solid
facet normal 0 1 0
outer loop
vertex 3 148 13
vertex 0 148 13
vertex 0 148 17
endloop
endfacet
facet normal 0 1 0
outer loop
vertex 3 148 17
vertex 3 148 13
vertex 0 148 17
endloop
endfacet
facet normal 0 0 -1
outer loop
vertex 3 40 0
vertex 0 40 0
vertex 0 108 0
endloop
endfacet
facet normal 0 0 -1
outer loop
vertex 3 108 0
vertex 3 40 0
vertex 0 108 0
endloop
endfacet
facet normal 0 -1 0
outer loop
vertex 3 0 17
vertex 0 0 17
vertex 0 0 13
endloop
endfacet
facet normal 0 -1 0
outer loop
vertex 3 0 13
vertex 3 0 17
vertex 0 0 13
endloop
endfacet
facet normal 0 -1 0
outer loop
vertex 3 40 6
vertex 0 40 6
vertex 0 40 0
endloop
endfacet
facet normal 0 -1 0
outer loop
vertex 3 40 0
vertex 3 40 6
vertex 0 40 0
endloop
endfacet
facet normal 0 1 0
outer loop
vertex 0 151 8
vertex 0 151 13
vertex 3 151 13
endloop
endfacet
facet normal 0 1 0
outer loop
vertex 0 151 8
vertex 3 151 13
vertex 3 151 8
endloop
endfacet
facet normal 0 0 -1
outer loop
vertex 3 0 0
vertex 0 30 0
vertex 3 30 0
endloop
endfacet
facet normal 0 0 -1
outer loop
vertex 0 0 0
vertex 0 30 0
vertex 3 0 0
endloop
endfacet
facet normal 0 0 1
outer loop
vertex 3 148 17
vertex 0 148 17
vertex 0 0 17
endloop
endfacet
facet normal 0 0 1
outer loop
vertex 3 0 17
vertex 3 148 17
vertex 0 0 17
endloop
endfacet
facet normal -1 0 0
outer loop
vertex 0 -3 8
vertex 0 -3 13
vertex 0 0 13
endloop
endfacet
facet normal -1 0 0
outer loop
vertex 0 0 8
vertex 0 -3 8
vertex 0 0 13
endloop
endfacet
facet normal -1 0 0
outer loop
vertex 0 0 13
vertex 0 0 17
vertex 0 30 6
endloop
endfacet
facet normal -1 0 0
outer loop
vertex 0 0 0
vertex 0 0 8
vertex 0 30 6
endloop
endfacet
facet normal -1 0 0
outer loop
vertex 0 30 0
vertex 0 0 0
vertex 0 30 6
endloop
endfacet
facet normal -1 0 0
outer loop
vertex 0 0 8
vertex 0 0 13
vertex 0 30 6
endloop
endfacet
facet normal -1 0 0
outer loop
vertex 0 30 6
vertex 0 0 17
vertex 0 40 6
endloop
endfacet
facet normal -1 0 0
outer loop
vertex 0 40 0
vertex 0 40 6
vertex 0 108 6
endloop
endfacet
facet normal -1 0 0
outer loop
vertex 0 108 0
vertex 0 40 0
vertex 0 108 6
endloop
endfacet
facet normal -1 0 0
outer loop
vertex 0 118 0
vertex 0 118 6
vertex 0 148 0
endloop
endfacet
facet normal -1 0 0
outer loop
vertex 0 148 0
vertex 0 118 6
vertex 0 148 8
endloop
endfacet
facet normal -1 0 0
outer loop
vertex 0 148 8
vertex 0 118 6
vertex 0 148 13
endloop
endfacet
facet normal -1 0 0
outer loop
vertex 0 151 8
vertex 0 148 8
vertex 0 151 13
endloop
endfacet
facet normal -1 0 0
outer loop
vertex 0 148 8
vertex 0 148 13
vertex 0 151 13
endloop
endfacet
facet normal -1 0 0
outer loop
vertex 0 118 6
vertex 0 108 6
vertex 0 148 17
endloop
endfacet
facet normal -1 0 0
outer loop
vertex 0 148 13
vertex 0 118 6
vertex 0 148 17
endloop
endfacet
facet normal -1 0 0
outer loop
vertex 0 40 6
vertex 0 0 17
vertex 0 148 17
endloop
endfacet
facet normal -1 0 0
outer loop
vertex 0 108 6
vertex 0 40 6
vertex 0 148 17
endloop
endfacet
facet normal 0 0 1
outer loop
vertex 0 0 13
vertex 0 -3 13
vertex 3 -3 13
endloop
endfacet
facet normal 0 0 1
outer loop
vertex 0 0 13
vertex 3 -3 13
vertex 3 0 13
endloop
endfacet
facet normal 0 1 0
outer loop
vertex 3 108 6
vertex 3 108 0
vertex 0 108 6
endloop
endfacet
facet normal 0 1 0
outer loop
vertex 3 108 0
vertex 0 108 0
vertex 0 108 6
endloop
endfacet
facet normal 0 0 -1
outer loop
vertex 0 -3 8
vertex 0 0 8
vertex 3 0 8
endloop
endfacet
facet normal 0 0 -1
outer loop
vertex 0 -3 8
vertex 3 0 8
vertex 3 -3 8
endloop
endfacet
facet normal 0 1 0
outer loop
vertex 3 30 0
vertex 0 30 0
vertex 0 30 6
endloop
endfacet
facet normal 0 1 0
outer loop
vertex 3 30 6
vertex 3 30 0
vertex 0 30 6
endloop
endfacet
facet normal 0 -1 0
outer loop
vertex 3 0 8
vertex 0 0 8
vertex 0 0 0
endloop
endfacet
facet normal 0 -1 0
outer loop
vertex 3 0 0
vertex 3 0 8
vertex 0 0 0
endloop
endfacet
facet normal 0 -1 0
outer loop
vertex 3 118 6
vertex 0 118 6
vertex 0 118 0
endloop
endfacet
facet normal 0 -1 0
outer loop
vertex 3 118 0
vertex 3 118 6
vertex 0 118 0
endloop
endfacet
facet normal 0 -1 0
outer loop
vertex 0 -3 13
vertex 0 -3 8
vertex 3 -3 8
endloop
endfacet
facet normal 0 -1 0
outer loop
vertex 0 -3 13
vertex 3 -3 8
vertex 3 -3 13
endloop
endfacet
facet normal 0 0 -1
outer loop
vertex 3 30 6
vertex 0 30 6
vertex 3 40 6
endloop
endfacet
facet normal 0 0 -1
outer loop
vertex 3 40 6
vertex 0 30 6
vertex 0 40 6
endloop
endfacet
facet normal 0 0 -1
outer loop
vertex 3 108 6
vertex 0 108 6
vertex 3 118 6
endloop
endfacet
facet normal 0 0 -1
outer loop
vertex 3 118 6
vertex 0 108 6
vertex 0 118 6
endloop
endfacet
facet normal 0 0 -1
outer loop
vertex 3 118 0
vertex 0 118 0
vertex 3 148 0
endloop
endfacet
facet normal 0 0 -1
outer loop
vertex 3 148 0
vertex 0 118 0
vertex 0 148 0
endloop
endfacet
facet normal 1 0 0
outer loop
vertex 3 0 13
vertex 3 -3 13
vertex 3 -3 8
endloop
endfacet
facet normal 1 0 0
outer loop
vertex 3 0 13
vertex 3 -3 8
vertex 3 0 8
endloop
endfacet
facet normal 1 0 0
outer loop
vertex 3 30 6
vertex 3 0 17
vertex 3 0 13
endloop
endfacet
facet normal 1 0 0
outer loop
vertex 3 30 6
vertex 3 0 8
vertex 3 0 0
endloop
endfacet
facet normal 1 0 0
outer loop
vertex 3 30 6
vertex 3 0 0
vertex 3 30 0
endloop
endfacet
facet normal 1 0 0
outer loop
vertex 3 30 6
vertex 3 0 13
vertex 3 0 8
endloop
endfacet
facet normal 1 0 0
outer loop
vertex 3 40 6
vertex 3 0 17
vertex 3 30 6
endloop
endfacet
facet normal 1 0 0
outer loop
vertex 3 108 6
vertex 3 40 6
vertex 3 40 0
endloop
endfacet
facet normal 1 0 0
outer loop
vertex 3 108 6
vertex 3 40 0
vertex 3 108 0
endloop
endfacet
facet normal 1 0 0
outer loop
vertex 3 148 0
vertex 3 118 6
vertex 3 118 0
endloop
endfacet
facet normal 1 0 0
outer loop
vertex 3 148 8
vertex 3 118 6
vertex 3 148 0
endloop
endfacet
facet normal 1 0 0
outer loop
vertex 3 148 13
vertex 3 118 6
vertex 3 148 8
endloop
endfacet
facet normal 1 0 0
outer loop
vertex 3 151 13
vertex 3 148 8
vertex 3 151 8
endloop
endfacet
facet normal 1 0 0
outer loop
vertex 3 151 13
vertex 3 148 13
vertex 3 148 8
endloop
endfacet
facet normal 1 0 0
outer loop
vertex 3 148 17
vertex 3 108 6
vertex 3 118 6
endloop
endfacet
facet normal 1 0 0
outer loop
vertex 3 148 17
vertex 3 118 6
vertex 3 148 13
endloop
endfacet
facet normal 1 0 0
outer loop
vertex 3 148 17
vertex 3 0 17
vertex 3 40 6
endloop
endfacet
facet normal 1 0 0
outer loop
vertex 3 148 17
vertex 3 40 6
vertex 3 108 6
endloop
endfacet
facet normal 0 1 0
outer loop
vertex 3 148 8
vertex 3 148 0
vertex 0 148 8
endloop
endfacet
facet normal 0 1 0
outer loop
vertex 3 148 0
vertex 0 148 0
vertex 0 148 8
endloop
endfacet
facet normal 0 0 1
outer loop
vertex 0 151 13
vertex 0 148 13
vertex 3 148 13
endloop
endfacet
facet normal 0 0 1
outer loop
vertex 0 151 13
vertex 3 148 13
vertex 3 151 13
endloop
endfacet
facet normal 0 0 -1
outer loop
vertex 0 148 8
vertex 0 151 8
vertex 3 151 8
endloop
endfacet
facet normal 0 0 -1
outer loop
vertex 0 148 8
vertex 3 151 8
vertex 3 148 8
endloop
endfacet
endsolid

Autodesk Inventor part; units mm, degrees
ref_plane "YZ Plane" through (0, 0, 0) normal (1, 0, 0) x (0, 1, 0)
ref_plane "XZ Plane" through (0, 0, 0) normal (0, 1, 0) x (-1, 0, 0)
ref_plane "XY Plane" through (0, 0, 0) normal (0, 0, 1) x (1, 0, 0)
sketch "Sketch1" plane through (0, 0, 0) normal (1, 0, 0) x (0, 1, 0)
  line L0 (0, 8) -> (-3, 8)
  line L1 (-3, 8) -> (-3, 13)
  line L2 (-3, 13) -> (0, 13)
  line L3 (0, 17) -> (0, 13)
  line L4 (0, 8) -> (0, 0)
  line L5 (148, 13) -> (151, 13)
  line L6 (151, 13) -> (151, 8)
  line L7 (151, 8) -> (148, 8)
  line L8 (148, 0) -> (148, 8)
  line L9 (148, 13) -> (148, 17)
  line L10 (30, 0) -> (30, 6)
  line L11 (30, 6) -> (40, 6)
  line L12 (40, 6) -> (40, 0)
  line L13 (108, 0) -> (108, 6)
  line L14 (108, 6) -> (118, 6)
  line L15 (118, 6) -> (118, 0)
  line L16 (40, 0) -> (108, 0)
  line L17 (148, 17) -> (0, 17)
  line L18 (30, 0) -> (0, 0)
  line L19 (118, 0) -> (148, 0)
  dimension "d1" = 148
  dimension "d2" = 5
  dimension "d3" = 3
  dimension "d7" = 10
  dimension "d9" = 30
  dimension "d31" = 6
  dimension "d38" = 17
  dimension "d39" = 8
  dimension "d40" = 2
extrude "Extrusion2" add sketch "Sketch1" along normal blind 3
properties part number "Electronics Chassis Wall"
